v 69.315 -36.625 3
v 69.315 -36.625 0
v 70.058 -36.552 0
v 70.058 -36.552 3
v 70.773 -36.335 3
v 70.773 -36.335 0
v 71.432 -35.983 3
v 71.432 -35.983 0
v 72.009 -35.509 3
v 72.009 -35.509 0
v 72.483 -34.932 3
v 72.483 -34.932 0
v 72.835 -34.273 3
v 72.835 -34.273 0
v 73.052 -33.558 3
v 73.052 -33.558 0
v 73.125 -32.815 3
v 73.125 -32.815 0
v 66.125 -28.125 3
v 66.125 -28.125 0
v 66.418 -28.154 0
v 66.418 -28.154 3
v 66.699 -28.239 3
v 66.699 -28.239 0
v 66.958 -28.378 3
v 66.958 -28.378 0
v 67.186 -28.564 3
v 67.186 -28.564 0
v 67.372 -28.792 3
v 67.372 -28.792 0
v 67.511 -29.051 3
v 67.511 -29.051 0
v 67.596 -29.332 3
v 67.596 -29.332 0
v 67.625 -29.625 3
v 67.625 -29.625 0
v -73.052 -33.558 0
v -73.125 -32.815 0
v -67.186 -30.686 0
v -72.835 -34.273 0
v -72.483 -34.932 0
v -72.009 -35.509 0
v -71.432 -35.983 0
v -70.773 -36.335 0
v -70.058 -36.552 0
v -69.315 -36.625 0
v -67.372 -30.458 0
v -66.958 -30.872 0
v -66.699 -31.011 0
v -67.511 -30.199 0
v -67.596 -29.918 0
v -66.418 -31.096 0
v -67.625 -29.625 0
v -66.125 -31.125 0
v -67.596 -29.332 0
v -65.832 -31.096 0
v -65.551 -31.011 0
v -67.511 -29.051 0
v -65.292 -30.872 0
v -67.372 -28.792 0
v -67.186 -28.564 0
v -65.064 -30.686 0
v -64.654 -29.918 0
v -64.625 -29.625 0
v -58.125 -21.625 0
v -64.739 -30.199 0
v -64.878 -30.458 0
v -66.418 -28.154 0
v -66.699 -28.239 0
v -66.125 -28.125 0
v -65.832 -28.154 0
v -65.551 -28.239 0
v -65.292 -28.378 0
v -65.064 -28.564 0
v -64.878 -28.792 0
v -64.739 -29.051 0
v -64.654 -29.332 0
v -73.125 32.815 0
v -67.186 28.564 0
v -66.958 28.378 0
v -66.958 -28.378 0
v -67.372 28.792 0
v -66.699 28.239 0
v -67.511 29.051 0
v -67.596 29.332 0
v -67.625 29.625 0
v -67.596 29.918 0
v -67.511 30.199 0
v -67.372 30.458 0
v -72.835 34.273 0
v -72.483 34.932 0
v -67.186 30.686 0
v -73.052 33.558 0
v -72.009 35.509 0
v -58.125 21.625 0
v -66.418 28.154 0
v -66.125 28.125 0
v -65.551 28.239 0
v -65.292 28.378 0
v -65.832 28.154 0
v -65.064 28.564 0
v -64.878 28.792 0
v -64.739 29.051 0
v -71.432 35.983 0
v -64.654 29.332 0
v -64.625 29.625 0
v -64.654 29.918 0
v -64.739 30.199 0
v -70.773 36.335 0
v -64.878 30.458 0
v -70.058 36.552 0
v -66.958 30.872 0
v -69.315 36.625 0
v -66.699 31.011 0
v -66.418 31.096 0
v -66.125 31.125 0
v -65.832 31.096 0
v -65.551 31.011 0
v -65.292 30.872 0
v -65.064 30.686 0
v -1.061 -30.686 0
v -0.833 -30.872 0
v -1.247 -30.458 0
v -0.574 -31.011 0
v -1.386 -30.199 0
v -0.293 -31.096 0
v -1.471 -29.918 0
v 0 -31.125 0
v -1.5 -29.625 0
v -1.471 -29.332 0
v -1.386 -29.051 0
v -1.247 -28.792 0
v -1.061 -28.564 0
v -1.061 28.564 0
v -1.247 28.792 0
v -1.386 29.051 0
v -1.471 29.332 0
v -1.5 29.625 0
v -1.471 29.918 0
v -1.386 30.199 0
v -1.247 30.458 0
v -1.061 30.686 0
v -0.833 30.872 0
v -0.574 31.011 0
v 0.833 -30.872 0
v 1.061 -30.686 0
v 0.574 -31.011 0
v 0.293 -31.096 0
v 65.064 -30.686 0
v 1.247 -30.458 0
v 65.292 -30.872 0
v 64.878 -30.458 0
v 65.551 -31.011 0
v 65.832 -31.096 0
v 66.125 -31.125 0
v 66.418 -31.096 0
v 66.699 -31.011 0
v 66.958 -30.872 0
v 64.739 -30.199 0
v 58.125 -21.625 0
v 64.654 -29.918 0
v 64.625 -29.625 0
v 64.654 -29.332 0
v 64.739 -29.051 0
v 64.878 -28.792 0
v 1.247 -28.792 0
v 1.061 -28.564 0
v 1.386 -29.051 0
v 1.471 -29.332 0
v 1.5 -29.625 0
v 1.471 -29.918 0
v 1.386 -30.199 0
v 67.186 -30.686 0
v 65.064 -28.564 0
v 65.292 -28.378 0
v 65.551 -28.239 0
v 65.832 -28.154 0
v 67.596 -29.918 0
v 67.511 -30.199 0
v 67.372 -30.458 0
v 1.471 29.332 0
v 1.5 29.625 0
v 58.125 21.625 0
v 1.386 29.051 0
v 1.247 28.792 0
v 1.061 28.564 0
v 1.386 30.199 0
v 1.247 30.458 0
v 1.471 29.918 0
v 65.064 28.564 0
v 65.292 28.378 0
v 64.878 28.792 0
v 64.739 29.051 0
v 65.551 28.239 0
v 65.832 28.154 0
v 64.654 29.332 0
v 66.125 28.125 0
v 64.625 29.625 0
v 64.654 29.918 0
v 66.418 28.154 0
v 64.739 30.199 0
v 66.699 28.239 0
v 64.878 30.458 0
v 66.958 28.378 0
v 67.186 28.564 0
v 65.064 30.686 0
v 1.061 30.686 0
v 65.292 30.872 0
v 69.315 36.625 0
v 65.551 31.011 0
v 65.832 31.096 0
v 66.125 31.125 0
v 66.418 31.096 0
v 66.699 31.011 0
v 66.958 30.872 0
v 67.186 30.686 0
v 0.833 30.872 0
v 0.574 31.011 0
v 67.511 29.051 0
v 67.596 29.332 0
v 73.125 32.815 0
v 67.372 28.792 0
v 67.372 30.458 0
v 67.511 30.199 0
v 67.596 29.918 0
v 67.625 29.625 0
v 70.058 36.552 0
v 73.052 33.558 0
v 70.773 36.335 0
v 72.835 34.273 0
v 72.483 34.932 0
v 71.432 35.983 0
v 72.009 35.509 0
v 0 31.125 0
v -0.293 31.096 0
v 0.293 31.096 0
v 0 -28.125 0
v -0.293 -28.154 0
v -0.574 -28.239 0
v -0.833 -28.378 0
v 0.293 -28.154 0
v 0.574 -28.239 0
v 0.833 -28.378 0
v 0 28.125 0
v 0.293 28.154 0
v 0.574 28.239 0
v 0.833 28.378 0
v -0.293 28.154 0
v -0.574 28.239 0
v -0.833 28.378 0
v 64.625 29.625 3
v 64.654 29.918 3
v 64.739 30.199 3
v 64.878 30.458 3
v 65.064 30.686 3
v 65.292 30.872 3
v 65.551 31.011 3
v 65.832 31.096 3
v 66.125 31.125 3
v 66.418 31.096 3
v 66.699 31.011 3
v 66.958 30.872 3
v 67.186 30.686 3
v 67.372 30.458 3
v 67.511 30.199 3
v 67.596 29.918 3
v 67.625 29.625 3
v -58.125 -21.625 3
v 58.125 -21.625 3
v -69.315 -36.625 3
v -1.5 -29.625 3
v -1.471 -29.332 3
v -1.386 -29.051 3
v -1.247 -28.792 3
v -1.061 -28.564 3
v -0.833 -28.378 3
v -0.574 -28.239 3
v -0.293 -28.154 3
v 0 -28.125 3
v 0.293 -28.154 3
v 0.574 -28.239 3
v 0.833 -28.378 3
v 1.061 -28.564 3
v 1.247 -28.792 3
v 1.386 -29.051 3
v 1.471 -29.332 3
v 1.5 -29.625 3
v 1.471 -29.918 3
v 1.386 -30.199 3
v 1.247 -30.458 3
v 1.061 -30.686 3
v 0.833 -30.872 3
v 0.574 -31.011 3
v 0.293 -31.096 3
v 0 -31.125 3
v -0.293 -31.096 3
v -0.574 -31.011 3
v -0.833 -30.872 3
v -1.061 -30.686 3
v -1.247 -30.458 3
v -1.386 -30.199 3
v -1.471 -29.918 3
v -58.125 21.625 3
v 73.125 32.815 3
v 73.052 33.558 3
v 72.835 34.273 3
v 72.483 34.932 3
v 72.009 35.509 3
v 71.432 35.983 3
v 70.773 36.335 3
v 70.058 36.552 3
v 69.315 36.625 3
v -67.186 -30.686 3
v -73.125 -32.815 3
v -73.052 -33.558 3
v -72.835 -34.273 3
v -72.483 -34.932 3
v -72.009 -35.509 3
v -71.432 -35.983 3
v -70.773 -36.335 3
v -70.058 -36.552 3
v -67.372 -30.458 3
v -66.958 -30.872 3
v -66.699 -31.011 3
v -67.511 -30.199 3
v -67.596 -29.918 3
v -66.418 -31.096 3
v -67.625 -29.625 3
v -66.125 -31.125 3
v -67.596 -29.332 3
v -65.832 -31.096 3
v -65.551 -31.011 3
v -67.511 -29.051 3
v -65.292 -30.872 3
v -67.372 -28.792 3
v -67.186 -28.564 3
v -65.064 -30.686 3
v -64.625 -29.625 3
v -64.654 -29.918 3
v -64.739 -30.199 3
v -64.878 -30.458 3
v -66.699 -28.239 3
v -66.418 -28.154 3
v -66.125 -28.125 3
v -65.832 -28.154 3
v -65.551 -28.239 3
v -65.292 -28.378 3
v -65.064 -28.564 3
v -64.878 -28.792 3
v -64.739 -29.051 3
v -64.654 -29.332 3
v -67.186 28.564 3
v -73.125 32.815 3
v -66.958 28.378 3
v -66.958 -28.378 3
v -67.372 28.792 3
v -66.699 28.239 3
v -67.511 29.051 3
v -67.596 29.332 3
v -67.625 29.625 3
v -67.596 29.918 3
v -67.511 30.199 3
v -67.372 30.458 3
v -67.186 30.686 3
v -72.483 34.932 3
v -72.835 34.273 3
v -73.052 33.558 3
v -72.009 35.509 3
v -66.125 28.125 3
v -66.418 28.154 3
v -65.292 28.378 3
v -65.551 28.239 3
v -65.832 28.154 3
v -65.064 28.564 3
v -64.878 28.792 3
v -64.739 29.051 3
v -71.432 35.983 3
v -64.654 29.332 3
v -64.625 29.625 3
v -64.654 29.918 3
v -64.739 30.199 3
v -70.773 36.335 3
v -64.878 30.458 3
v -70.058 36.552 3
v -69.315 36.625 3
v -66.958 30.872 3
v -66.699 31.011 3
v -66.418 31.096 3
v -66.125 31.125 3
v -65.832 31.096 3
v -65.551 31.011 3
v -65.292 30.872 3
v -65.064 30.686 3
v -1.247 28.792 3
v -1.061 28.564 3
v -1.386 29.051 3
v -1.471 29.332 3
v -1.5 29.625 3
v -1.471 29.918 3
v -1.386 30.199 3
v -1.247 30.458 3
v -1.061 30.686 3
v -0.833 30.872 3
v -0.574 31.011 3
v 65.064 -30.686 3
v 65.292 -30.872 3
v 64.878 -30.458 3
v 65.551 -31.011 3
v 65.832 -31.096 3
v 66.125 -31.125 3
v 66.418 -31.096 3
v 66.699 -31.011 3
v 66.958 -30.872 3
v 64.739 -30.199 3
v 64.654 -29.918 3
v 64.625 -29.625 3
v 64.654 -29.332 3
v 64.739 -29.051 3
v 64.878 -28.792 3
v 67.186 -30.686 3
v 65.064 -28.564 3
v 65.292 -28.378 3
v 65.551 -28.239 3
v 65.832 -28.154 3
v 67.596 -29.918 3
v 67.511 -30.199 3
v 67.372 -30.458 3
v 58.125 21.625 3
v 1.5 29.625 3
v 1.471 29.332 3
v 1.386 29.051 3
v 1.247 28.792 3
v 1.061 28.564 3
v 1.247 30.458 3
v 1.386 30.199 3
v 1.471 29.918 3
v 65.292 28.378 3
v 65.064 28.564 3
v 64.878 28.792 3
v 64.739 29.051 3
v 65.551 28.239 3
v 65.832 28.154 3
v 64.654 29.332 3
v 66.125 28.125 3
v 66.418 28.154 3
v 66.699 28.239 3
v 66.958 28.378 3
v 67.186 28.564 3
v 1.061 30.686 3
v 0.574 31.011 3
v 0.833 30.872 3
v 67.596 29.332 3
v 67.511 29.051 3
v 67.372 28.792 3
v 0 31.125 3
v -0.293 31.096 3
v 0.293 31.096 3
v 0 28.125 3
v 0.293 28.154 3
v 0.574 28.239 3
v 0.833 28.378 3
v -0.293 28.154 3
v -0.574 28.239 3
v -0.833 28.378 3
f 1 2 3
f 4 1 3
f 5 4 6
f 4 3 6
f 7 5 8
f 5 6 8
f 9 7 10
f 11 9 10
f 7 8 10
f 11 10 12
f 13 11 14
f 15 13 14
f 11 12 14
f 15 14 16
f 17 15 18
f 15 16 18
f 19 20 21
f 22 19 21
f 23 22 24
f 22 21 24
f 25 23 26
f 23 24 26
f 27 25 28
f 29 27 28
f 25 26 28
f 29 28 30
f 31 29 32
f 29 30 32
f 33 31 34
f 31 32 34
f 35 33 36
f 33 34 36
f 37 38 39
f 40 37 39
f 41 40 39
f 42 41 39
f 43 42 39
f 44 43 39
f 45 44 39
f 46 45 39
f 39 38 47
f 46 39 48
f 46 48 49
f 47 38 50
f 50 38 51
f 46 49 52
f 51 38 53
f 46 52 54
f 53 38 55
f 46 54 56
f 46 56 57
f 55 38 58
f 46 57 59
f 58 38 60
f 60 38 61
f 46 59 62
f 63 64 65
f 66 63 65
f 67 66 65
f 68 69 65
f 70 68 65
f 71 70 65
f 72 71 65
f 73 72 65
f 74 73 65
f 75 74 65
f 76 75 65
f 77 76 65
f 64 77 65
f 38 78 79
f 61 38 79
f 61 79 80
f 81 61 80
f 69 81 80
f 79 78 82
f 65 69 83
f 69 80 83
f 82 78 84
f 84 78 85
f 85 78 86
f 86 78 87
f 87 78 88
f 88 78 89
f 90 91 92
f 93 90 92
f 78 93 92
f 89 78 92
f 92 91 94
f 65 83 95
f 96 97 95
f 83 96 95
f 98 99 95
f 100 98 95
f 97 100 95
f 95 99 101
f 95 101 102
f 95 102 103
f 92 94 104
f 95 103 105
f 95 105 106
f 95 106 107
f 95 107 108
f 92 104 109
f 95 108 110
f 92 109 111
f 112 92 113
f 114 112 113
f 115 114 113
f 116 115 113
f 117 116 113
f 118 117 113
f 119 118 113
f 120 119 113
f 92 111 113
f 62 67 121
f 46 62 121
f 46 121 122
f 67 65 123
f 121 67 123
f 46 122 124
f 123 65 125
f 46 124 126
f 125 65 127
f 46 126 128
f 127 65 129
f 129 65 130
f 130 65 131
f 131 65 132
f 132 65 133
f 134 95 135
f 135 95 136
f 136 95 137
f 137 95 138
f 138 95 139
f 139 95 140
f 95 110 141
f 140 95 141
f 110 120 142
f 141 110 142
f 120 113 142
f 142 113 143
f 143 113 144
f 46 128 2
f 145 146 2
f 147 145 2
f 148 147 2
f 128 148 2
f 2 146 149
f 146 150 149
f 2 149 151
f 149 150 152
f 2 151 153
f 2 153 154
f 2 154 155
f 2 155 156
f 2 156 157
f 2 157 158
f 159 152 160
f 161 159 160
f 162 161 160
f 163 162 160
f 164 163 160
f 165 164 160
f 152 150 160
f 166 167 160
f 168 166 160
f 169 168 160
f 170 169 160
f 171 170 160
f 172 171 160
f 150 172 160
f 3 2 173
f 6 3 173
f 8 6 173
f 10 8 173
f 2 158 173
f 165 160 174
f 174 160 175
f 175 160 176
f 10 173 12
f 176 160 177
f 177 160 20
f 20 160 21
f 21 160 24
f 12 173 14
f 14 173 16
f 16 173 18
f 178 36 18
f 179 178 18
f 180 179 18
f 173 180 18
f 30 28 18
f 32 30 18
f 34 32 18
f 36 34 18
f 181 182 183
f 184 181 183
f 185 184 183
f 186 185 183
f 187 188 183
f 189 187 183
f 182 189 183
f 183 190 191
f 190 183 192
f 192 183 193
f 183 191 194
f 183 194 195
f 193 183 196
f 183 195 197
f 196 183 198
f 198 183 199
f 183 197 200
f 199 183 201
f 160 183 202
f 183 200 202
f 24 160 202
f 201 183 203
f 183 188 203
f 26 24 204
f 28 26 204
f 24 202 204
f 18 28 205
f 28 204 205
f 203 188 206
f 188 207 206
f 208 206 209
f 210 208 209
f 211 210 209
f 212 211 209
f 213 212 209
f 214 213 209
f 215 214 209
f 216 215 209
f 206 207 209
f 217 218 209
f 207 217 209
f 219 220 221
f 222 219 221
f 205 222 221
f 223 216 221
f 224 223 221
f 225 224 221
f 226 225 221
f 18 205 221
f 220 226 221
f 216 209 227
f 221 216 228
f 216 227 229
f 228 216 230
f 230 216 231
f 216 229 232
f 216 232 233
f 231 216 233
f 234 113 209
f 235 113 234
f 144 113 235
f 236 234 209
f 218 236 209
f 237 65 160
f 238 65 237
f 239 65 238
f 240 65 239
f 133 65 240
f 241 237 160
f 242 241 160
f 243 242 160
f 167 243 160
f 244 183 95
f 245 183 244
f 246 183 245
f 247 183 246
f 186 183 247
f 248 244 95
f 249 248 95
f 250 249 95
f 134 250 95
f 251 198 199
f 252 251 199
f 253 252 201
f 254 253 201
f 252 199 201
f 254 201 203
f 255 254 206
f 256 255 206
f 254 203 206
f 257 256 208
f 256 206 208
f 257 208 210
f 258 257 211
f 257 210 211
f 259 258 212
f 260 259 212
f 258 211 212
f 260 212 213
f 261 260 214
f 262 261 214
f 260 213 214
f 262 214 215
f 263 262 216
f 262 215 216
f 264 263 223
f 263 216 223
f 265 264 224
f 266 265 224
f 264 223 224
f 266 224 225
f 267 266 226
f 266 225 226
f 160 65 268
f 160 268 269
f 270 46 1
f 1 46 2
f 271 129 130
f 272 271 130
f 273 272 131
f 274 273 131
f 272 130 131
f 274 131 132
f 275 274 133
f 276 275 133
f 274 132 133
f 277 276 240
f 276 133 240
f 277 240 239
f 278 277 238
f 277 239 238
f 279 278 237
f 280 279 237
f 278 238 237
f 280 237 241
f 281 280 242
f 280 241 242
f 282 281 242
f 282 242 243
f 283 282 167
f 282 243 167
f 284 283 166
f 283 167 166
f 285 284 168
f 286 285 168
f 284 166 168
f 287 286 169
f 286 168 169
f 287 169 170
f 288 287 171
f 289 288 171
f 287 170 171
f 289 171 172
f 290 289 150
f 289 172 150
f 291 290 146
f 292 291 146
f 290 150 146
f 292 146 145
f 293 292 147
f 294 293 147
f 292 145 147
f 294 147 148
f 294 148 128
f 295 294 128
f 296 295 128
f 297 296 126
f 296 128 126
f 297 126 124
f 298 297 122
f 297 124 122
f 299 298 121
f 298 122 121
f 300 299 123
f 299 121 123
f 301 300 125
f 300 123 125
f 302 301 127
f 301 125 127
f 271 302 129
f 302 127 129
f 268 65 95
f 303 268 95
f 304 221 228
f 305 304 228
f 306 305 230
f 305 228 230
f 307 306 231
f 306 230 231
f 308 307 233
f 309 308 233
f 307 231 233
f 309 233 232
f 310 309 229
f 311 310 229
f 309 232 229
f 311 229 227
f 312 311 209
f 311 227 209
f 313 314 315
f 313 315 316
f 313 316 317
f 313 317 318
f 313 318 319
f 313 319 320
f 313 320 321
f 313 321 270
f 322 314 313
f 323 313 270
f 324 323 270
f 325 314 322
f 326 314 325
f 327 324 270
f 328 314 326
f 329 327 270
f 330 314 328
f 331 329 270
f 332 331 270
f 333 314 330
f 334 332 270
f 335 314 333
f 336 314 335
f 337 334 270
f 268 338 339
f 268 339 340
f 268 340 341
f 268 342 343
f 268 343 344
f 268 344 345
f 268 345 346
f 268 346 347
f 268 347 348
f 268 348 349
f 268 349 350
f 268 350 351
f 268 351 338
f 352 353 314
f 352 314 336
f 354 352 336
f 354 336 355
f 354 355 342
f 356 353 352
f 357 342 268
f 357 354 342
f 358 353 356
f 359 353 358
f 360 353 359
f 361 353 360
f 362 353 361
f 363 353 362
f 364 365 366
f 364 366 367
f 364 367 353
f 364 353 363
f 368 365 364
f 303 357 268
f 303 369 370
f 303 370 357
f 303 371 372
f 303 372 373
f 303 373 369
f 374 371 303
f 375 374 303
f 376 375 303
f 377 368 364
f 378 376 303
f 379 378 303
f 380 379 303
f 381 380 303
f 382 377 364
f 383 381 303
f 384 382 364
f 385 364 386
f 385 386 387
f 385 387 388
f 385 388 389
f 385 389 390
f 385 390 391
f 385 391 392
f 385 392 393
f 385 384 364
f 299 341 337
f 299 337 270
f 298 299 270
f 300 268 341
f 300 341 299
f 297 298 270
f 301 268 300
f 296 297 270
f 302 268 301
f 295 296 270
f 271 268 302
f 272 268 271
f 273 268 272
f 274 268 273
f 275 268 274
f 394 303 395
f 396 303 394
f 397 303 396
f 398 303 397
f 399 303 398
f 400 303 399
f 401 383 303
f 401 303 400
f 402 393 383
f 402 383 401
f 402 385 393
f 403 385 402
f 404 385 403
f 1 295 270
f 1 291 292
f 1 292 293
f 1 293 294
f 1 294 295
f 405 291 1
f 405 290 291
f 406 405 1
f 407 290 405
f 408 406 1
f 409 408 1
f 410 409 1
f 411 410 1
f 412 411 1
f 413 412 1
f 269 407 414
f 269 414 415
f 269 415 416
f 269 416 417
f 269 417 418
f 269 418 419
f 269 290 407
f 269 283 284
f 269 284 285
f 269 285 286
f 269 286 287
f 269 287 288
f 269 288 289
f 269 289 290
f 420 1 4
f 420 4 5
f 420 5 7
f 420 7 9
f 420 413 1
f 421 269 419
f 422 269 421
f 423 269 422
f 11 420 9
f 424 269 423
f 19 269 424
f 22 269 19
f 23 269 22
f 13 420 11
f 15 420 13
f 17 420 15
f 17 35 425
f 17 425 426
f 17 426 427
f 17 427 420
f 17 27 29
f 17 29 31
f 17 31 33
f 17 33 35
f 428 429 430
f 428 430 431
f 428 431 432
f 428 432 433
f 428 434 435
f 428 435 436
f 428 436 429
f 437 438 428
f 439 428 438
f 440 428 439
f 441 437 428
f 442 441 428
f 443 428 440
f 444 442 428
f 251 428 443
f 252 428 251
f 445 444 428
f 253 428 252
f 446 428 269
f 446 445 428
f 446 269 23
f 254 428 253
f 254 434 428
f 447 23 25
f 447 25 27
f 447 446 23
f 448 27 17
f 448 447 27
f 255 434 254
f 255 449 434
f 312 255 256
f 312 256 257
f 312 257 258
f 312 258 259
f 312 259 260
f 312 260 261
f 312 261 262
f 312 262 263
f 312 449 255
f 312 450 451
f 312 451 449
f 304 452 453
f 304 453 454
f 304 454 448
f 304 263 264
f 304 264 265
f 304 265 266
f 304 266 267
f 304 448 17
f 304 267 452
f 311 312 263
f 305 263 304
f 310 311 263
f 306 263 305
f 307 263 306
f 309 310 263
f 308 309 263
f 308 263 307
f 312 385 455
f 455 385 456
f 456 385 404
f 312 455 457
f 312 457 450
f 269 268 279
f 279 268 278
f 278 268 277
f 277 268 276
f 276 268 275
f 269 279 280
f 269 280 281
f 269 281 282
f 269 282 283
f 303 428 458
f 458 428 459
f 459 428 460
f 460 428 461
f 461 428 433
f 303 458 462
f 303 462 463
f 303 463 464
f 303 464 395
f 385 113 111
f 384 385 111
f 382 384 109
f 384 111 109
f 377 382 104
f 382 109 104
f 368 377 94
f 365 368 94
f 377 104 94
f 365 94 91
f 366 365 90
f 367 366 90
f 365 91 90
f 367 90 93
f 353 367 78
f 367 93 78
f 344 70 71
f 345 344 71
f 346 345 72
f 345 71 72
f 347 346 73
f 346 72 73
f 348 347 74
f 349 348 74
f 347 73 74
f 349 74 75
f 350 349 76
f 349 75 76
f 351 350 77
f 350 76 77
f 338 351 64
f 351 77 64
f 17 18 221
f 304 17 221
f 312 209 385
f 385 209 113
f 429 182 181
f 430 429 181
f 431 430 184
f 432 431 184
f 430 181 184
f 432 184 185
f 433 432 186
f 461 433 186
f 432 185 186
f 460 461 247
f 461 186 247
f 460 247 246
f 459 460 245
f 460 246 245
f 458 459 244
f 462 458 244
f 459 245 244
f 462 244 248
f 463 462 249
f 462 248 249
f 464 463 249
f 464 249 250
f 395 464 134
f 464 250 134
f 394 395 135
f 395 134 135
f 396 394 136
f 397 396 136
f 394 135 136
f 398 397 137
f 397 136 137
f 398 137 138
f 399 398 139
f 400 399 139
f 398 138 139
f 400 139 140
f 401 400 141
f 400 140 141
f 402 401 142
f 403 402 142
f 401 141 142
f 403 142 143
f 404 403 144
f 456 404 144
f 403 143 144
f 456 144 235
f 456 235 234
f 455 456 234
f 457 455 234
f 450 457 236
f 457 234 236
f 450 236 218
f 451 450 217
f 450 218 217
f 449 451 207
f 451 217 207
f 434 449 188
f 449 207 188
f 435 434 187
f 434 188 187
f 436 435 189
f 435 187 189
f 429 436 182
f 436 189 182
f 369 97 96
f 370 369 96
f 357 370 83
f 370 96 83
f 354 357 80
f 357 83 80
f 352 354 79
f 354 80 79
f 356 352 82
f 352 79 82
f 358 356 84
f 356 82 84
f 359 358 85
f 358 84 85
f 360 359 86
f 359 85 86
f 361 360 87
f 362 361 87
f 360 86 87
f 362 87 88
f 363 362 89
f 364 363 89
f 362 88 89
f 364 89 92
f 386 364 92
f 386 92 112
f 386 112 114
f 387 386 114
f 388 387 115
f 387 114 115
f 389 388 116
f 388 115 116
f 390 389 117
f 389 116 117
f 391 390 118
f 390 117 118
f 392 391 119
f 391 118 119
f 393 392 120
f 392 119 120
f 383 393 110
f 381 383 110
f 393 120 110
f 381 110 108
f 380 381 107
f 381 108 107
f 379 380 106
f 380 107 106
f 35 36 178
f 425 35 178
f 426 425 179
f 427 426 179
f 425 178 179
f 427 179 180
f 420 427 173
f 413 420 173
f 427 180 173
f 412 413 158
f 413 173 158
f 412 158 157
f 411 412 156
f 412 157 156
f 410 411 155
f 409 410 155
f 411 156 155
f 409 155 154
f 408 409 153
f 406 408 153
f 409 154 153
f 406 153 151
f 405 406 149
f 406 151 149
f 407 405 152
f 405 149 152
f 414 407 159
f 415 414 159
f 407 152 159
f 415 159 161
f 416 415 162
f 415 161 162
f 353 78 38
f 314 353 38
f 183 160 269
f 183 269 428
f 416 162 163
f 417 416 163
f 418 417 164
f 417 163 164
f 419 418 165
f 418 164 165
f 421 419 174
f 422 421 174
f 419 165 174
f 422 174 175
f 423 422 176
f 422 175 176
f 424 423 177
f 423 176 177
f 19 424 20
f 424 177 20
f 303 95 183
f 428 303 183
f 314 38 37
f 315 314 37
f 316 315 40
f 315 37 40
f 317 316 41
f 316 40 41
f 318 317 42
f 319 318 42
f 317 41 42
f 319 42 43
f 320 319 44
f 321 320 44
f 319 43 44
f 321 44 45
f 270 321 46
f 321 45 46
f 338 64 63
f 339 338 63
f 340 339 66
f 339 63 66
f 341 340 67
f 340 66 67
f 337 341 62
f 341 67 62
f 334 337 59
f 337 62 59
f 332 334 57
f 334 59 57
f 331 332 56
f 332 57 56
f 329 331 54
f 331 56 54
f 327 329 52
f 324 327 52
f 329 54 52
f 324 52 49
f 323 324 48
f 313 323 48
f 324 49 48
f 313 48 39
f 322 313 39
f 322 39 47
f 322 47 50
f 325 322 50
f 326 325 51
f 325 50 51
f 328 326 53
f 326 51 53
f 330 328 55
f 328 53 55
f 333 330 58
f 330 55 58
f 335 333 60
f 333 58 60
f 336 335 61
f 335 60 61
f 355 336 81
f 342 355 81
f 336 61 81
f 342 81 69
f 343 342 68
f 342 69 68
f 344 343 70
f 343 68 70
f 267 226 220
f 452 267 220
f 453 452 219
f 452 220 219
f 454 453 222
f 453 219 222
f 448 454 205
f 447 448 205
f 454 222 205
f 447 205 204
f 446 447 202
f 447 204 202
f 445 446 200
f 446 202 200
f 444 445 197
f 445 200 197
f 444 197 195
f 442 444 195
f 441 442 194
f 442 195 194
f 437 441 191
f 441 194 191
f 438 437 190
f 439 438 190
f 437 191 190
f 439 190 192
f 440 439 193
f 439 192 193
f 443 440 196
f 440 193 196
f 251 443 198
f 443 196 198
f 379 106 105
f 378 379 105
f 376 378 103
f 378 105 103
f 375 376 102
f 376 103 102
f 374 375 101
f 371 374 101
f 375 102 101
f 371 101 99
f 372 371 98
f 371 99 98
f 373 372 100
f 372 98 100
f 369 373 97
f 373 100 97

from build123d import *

# Parameters (mm, degrees)
F0_W     = 116.25
F0_H     = 43.25
F1_DEPTH = 3


with BuildPart() as f1:
    # F0 (on Top) → F1 (new body)
    with BuildSketch(Plane.XY):
        with BuildLine():
            Line((69.315, 36.625), (-69.315, 36.625))
            ThreePointArc((-69.315, 36.625), (-72.009077, 35.509077), (-73.125, 32.815))
            Line((-73.125, 32.815), (-73.125, -32.815))
            ThreePointArc((-73.125, -32.815), (-72.009077, -35.509077), (-69.315, -36.625))
            Line((-69.315, -36.625), (69.315, -36.625))
            ThreePointArc((69.315, -36.625), (72.009077, -35.509077), (73.125, -32.815))
            Line((73.125, -32.815), (73.125, 32.815))
            ThreePointArc((73.125, 32.815), (72.009077, 35.509077), (69.315, 36.625))
        make_face()
        with BuildLine():
            ThreePointArc((-66.125, 28.125), (-67.18566, 30.68566), (-64.625, 29.625))
            Line((-64.625, 29.625), (-1.5, 29.625))
            ThreePointArc((-1.5, 29.625), (0, 31.125), (1.5, 29.625))
            Line((1.5, 29.625), (64.625, 29.625))
            ThreePointArc((64.625, 29.625), (66.125, 31.125), (67.625, 29.625))
            ThreePointArc((67.625, 29.625), (67.18566, 28.56434), (66.125, 28.125))
            Line((66.125, 28.125), (66.125, -28.125))
            ThreePointArc((66.125, -28.125), (67.18566, -28.56434), (67.625, -29.625))
            ThreePointArc((67.625, -29.625), (66.125, -31.125), (64.625, -29.625))
            Line((64.625, -29.625), (1.5, -29.625))
            ThreePointArc((1.5, -29.625), (0, -31.125), (-1.5, -29.625))
            Line((-1.5, -29.625), (-64.625, -29.625))
            ThreePointArc((-64.625, -29.625), (-67.18566, -30.68566), (-66.125, -28.125))
            Line((-66.125, -28.125), (-66.125, 28.125))
        make_face(mode=Mode.SUBTRACT)
        with BuildLine():
            Line((-1.5, 29.625), (-64.625, 29.625))
            ThreePointArc((-64.625, 29.625), (-65.06434, 28.56434), (-66.125, 28.125))
            Line((-66.125, 28.125), (-66.125, -28.125))
            ThreePointArc((-66.125, -28.125), (-65.06434, -28.56434), (-64.625, -29.625))
            Line((-64.625, -29.625), (-1.5, -29.625))
            ThreePointArc((-1.5, -29.625), (0, -28.125), (1.5, -29.625))
            Line((1.5, -29.625), (64.625, -29.625))
            ThreePointArc((64.625, -29.625), (65.06434, -28.56434), (66.125, -28.125))
            Line((66.125, -28.125), (66.125, 28.125))
            ThreePointArc((66.125, 28.125), (65.06434, 28.56434), (64.625, 29.625))
            Line((64.625, 29.625), (1.5, 29.625))
            ThreePointArc((1.5, 29.625), (0, 28.125), (-1.5, 29.625))
        make_face()
        Rectangle(F0_W, F0_H, mode=Mode.SUBTRACT)
    extrude(amount=F1_DEPTH)


solid = f1.part
